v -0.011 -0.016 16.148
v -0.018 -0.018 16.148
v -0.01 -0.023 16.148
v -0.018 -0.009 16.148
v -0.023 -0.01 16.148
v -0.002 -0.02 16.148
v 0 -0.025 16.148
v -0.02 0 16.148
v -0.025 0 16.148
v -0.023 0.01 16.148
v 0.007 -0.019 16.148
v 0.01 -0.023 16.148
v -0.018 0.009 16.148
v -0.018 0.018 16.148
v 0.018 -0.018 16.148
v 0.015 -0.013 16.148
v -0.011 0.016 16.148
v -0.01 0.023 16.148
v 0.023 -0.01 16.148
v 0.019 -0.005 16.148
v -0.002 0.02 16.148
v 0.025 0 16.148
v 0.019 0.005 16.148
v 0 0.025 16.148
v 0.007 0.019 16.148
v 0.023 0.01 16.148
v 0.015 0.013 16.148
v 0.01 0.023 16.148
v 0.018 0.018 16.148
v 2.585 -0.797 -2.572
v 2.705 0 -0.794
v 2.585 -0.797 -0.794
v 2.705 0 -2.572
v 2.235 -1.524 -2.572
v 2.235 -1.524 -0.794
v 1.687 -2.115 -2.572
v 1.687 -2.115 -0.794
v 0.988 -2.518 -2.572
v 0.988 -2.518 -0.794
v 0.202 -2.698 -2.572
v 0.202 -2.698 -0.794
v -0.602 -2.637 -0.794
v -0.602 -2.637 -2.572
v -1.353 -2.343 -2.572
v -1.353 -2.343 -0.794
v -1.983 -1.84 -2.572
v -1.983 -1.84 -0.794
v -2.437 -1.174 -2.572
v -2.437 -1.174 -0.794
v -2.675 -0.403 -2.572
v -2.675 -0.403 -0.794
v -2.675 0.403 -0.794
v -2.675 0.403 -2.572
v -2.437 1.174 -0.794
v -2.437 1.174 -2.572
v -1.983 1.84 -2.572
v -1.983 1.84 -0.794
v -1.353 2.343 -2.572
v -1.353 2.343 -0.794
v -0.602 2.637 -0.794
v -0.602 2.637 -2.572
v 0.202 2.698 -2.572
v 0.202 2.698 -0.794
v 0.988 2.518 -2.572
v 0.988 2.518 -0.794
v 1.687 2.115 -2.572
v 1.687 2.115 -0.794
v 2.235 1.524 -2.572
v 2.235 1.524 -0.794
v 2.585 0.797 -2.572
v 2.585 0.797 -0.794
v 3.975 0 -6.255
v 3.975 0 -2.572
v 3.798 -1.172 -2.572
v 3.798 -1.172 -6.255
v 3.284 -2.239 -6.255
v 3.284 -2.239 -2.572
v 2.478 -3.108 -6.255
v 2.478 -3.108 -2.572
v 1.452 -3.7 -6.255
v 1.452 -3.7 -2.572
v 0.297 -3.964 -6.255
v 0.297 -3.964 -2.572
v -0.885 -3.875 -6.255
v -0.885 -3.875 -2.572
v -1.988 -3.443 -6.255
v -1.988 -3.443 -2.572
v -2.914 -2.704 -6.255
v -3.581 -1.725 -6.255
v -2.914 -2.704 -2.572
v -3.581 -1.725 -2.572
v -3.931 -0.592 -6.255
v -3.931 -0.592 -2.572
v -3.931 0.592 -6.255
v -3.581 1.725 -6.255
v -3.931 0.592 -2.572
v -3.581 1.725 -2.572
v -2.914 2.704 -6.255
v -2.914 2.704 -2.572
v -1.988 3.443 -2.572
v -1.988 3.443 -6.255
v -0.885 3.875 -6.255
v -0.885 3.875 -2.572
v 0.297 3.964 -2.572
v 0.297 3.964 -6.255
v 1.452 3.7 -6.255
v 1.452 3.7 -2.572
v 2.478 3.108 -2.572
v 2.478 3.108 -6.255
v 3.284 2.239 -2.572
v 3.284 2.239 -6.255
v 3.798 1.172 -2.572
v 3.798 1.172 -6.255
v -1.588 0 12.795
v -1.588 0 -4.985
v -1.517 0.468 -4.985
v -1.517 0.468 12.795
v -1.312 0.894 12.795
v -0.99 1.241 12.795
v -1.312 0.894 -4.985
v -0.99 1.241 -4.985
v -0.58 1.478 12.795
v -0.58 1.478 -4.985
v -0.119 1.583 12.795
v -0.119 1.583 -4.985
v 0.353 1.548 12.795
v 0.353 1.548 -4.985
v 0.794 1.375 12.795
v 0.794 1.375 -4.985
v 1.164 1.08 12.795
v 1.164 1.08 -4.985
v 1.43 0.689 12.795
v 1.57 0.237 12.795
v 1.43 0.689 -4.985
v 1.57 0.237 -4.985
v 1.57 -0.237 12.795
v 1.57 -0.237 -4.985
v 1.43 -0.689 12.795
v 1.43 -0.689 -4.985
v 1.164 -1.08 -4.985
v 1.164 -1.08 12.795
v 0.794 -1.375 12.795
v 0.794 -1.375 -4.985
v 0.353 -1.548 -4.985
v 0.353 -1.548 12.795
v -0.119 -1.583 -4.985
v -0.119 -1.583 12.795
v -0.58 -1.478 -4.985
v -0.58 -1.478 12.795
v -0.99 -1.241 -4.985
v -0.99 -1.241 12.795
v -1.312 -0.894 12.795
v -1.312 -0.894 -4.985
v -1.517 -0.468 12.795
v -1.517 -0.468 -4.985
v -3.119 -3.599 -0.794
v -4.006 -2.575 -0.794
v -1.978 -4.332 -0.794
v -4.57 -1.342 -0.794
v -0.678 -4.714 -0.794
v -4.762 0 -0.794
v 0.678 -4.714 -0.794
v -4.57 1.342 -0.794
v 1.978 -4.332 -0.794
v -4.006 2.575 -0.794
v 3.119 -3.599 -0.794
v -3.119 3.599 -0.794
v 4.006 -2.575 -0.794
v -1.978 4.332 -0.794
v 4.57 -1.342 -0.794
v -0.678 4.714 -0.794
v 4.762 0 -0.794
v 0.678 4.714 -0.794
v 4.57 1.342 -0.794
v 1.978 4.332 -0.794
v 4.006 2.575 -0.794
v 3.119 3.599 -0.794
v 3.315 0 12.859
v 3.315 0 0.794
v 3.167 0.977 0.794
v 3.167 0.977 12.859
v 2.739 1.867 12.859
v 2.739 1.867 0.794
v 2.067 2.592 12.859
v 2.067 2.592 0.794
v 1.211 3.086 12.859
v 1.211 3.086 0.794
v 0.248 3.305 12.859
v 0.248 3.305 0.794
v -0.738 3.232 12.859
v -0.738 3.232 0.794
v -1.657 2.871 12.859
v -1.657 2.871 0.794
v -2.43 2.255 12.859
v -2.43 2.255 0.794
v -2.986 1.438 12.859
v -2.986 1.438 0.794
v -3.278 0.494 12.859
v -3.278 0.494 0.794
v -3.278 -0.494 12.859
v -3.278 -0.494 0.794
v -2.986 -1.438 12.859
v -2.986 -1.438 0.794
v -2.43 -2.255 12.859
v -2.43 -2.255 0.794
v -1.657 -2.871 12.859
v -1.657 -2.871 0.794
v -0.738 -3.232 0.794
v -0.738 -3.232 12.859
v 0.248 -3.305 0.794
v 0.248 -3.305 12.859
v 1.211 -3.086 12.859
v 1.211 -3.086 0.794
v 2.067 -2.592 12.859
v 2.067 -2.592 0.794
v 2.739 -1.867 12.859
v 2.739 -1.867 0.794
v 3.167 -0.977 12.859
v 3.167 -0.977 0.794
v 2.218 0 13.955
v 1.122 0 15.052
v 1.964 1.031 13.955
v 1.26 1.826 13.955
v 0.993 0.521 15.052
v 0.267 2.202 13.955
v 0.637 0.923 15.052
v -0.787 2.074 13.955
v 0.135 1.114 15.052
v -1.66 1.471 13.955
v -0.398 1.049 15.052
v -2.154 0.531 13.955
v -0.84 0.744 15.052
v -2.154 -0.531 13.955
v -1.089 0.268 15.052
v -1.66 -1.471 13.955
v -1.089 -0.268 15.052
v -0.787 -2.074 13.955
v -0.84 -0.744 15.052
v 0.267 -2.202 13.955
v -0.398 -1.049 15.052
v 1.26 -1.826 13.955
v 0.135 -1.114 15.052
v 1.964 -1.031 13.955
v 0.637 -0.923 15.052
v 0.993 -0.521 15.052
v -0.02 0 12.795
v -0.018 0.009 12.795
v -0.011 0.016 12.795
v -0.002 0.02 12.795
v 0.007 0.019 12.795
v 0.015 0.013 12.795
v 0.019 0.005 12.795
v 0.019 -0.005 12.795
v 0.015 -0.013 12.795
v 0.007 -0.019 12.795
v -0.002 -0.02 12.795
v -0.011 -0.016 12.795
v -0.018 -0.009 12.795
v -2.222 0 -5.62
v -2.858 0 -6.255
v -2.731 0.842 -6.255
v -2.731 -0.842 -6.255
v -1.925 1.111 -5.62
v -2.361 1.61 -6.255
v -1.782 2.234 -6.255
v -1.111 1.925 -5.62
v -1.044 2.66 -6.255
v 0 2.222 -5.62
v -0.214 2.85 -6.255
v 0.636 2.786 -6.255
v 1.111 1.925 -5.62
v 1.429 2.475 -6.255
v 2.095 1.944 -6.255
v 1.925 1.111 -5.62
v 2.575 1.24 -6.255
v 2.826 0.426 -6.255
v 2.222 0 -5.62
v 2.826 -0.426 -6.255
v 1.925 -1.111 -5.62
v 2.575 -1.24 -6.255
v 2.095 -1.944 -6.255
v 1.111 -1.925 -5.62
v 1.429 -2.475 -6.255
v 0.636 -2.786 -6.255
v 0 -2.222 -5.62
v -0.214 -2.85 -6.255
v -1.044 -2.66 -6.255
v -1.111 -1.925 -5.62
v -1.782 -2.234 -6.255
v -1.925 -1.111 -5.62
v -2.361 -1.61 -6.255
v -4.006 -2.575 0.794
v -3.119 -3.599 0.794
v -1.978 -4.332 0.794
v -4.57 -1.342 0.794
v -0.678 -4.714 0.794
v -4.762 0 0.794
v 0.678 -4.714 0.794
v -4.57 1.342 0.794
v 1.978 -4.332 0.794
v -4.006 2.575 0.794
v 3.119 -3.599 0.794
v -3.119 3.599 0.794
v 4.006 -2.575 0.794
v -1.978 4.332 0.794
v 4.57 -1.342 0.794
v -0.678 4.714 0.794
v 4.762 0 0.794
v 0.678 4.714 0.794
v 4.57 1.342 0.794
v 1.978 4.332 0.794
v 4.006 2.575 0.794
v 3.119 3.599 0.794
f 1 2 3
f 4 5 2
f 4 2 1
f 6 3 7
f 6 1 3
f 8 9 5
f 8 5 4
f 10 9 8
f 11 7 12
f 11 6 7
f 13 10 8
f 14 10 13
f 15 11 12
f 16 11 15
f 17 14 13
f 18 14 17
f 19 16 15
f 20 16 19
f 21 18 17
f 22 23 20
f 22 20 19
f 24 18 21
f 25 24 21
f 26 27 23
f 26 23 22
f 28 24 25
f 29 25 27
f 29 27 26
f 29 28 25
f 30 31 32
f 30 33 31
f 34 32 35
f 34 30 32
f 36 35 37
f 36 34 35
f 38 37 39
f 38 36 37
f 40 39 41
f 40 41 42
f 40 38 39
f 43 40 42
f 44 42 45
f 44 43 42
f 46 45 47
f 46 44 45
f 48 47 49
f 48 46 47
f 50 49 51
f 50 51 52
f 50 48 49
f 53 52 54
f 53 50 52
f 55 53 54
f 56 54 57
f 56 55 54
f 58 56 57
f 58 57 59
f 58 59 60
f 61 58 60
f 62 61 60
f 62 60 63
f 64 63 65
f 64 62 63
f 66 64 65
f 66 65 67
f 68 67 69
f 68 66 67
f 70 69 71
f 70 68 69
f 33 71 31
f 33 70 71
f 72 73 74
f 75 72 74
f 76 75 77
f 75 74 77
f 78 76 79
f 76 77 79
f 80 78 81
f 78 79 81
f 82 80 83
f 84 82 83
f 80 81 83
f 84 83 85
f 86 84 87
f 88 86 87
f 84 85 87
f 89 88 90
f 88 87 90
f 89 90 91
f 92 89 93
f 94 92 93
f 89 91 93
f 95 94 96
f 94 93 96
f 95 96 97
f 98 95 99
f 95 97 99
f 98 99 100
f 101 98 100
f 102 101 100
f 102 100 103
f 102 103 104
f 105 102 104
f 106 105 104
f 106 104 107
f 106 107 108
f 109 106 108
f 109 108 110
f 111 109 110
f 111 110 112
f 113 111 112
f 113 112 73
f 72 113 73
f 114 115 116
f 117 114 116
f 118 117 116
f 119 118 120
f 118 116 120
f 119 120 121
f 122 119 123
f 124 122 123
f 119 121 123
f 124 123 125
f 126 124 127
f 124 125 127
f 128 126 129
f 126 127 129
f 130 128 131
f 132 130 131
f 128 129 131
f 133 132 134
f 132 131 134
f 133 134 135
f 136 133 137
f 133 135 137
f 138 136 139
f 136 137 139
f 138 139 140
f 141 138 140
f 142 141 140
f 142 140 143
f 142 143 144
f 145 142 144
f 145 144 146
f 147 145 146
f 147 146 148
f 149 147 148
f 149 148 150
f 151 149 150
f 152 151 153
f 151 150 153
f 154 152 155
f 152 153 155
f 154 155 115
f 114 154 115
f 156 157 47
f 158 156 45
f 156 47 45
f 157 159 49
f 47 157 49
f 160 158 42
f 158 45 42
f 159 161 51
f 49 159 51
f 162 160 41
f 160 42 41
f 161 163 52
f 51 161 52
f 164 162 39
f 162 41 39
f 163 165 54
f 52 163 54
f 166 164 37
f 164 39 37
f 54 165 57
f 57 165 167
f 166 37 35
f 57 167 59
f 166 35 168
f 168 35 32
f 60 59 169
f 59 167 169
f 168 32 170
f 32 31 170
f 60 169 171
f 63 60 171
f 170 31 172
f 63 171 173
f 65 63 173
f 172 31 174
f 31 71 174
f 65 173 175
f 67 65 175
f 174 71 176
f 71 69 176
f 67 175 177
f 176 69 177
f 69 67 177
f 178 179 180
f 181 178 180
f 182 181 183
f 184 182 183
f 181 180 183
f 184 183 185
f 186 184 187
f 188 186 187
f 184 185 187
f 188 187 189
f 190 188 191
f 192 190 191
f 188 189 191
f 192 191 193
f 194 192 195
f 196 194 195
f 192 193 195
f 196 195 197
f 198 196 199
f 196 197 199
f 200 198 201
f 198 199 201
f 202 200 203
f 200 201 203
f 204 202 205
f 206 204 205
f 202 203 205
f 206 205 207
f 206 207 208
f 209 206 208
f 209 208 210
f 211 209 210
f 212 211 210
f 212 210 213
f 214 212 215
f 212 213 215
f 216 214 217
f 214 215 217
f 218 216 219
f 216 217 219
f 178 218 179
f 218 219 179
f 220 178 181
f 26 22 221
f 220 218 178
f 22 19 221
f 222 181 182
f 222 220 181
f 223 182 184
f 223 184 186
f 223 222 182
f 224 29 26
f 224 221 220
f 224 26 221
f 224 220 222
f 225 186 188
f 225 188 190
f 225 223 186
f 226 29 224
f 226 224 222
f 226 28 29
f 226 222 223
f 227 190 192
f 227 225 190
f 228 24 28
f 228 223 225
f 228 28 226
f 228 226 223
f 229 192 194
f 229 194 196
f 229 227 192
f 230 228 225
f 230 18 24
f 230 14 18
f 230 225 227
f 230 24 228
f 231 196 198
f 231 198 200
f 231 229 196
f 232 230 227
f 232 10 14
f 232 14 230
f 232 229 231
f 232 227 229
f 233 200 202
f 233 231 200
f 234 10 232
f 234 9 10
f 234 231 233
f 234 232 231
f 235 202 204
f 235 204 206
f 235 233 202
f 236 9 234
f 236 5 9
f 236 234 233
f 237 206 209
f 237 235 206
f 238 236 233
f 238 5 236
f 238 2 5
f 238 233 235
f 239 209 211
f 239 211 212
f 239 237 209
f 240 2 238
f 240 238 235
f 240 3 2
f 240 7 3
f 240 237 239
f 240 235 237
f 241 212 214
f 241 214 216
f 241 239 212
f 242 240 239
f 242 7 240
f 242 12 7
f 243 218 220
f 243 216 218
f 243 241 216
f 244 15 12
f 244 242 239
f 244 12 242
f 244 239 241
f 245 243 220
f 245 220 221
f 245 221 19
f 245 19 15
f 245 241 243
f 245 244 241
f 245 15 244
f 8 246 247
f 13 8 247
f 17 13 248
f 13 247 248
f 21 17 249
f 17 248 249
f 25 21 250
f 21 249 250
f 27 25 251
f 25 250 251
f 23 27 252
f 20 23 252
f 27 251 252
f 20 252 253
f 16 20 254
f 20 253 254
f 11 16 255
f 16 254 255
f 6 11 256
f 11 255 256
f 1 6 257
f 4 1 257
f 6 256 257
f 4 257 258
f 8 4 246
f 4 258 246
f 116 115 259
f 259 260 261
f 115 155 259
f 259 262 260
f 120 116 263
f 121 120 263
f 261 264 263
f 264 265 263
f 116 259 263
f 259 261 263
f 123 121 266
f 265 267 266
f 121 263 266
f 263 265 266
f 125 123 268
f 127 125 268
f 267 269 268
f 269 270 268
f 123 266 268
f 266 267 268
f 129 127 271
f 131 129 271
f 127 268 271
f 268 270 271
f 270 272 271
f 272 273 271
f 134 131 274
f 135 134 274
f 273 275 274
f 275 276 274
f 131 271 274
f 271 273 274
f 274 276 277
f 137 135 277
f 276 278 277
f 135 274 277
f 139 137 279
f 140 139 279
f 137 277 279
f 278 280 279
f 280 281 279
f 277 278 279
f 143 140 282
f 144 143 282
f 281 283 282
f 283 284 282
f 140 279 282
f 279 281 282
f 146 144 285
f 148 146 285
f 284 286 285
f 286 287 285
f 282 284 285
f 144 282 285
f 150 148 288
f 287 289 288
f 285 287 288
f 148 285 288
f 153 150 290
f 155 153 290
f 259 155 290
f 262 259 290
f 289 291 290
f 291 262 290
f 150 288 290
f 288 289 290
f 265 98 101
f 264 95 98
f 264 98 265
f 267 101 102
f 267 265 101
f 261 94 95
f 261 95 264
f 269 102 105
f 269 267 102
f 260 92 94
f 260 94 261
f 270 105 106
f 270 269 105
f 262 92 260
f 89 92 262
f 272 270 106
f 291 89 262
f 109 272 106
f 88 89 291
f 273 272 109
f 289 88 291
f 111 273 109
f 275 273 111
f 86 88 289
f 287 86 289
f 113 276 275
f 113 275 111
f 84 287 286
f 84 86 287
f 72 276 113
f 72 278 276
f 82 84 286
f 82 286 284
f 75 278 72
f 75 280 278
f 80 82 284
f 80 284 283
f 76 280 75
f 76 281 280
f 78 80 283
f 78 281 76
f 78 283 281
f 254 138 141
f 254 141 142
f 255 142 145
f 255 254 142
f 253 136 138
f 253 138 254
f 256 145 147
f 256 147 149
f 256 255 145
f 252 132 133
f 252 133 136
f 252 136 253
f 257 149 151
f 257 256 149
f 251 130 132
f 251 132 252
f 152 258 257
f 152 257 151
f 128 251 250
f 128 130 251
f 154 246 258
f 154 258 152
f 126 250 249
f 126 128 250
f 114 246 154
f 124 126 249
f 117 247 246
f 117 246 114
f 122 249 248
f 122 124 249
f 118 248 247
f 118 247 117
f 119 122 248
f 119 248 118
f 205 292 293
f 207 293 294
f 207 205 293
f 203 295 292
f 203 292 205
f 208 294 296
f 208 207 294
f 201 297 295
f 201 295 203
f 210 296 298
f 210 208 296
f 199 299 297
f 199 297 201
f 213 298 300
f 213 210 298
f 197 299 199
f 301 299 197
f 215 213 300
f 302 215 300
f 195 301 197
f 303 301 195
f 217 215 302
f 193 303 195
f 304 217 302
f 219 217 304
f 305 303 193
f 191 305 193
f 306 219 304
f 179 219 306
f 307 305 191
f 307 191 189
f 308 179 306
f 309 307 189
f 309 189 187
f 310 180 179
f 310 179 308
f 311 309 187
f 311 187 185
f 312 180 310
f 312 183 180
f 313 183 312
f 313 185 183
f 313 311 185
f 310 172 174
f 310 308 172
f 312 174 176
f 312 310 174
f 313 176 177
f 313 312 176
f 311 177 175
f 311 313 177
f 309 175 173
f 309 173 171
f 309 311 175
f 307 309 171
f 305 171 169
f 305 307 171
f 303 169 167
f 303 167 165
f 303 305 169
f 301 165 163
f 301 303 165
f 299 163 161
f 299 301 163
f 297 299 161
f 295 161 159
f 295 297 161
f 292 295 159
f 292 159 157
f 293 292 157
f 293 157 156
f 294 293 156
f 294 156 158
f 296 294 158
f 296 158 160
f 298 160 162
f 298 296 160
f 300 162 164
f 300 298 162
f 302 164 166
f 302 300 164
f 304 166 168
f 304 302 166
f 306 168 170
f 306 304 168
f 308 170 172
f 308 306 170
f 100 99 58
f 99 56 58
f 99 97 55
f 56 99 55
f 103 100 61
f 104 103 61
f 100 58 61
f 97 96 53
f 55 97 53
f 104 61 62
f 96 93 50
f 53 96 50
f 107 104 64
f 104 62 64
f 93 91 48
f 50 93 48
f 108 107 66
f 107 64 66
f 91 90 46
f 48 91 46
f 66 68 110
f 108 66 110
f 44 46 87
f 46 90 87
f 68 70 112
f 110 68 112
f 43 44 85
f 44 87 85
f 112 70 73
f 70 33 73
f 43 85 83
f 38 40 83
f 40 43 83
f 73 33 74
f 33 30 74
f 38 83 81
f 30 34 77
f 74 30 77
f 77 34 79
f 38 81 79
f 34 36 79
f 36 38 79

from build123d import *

# Parameters (mm, degrees)
SKETCH1_R           = 4.7625
BOSS_EXTRUDE1_DEPTH = 0.79375
SKETCH2_R           = 3.9751
BOSS_EXTRUDE2_DEPTH = 5.461
SKETCH3_R           = 3.3147
BOSS_EXTRUDE3_DEPTH = 12.065
SKETCH6_R           = 1.5875
CUT_EXTRUDE1_DEPTH  = 19.05
SKETCH10_W          = 1.27
SKETCH10_H          = 1.778
SKETCH11_R          = 0.0508
CUT_EXTRUDE3_DEPTH  = 0.0254
SKETCH9_R           = 0.02
CUT_EXTRUDE2_DEPTH  = 23.4028
CHAMFER1_SIZE       = 1.27


with BuildPart() as part:
    # Sketch1 → Boss-Extrude1 (new body, symmetric)
    with BuildSketch(Plane.XY):
        Circle(SKETCH1_R)
    extrude(amount=BOSS_EXTRUDE1_DEPTH, both=True)

    # Sketch2 → Boss-Extrude2 (add)
    with BuildSketch(Plane(origin=(0, 0, -0.79375), x_dir=(-1, 0, 0), z_dir=(0, 0, -1))):
        with Locations(Location((0, 0, 0), (0, 0, 180))):  # turned: the seam where the file's is
            Circle(SKETCH2_R)
    extrude(amount=BOSS_EXTRUDE2_DEPTH)

    # Sketch3 → Boss-Extrude3 (add)
    with BuildSketch(Plane.XY.offset(0.79375)):
        Circle(SKETCH3_R)
    extrude(amount=BOSS_EXTRUDE3_DEPTH)

    # Sketch5 → Revolve1 (revolve)
    with BuildSketch(Plane(origin=(0, 0, 0), x_dir=(0, 0, -1), z_dir=(1, 0, 0)), mode=Mode.PRIVATE) as revolve1_sk:
        Polygon((-12.85875, 3.3147), (-16.17345, 0), (-12.85875, 0), align=None)
    revolve(revolve1_sk.sketch.rotate(Axis((0, 0, 0), (0, 0, 1)), 270), axis=Axis((0, 0, 0), (0, 0, 1)))  # turned: the seam where the file's is

    # Sketch6 → Cut-Extrude1 (cut)
    with BuildSketch(Plane(origin=(0, 0, -6.25475), x_dir=(-1, 0, 0), z_dir=(0, 0, -1))):
        Circle(SKETCH6_R)
    extrude(amount=-CUT_EXTRUDE1_DEPTH, mode=Mode.SUBTRACT)

    # Sketch10 → Cut-Revolve1 (revolve, cut)
    with BuildSketch(Plane(origin=(0, 0, 0), x_dir=(1, 0, 0), z_dir=(0, 1, 0)), mode=Mode.PRIVATE) as cut_revolve1_sk:
        with Locations((-3.3401, 1.68275)):
            Rectangle(SKETCH10_W, SKETCH10_H)
    revolve(cut_revolve1_sk.sketch.rotate(Axis((0, 0, 0), (0, 0, -1)), 180), axis=Axis((0, 0, 0), (0, 0, -1)), mode=Mode.SUBTRACT)  # turned: the seam where the file's is

    # Sketch11 → Cut-Extrude3 (cut)
    with BuildSketch(Plane.XY.offset(16.17345)):
        Circle(SKETCH11_R)
    extrude(amount=-CUT_EXTRUDE3_DEPTH, mode=Mode.SUBTRACT)

    # Sketch9 → Cut-Extrude2 (cut, through all)
    with BuildSketch(Plane(origin=(0, 0, -6.25475), x_dir=(-1, 0, 0), z_dir=(0, 0, -1))):
        Circle(SKETCH9_R)
    extrude(amount=-CUT_EXTRUDE2_DEPTH, mode=Mode.SUBTRACT)

    # Chamfer1
    chamfer1_edges = [part.edges().sort_by_distance(p)[0] for p in [
        (1.5875, 0, -6.25475),
    ]]
    chamfer(chamfer1_edges, length=CHAMFER1_SIZE)


solid = part.part
